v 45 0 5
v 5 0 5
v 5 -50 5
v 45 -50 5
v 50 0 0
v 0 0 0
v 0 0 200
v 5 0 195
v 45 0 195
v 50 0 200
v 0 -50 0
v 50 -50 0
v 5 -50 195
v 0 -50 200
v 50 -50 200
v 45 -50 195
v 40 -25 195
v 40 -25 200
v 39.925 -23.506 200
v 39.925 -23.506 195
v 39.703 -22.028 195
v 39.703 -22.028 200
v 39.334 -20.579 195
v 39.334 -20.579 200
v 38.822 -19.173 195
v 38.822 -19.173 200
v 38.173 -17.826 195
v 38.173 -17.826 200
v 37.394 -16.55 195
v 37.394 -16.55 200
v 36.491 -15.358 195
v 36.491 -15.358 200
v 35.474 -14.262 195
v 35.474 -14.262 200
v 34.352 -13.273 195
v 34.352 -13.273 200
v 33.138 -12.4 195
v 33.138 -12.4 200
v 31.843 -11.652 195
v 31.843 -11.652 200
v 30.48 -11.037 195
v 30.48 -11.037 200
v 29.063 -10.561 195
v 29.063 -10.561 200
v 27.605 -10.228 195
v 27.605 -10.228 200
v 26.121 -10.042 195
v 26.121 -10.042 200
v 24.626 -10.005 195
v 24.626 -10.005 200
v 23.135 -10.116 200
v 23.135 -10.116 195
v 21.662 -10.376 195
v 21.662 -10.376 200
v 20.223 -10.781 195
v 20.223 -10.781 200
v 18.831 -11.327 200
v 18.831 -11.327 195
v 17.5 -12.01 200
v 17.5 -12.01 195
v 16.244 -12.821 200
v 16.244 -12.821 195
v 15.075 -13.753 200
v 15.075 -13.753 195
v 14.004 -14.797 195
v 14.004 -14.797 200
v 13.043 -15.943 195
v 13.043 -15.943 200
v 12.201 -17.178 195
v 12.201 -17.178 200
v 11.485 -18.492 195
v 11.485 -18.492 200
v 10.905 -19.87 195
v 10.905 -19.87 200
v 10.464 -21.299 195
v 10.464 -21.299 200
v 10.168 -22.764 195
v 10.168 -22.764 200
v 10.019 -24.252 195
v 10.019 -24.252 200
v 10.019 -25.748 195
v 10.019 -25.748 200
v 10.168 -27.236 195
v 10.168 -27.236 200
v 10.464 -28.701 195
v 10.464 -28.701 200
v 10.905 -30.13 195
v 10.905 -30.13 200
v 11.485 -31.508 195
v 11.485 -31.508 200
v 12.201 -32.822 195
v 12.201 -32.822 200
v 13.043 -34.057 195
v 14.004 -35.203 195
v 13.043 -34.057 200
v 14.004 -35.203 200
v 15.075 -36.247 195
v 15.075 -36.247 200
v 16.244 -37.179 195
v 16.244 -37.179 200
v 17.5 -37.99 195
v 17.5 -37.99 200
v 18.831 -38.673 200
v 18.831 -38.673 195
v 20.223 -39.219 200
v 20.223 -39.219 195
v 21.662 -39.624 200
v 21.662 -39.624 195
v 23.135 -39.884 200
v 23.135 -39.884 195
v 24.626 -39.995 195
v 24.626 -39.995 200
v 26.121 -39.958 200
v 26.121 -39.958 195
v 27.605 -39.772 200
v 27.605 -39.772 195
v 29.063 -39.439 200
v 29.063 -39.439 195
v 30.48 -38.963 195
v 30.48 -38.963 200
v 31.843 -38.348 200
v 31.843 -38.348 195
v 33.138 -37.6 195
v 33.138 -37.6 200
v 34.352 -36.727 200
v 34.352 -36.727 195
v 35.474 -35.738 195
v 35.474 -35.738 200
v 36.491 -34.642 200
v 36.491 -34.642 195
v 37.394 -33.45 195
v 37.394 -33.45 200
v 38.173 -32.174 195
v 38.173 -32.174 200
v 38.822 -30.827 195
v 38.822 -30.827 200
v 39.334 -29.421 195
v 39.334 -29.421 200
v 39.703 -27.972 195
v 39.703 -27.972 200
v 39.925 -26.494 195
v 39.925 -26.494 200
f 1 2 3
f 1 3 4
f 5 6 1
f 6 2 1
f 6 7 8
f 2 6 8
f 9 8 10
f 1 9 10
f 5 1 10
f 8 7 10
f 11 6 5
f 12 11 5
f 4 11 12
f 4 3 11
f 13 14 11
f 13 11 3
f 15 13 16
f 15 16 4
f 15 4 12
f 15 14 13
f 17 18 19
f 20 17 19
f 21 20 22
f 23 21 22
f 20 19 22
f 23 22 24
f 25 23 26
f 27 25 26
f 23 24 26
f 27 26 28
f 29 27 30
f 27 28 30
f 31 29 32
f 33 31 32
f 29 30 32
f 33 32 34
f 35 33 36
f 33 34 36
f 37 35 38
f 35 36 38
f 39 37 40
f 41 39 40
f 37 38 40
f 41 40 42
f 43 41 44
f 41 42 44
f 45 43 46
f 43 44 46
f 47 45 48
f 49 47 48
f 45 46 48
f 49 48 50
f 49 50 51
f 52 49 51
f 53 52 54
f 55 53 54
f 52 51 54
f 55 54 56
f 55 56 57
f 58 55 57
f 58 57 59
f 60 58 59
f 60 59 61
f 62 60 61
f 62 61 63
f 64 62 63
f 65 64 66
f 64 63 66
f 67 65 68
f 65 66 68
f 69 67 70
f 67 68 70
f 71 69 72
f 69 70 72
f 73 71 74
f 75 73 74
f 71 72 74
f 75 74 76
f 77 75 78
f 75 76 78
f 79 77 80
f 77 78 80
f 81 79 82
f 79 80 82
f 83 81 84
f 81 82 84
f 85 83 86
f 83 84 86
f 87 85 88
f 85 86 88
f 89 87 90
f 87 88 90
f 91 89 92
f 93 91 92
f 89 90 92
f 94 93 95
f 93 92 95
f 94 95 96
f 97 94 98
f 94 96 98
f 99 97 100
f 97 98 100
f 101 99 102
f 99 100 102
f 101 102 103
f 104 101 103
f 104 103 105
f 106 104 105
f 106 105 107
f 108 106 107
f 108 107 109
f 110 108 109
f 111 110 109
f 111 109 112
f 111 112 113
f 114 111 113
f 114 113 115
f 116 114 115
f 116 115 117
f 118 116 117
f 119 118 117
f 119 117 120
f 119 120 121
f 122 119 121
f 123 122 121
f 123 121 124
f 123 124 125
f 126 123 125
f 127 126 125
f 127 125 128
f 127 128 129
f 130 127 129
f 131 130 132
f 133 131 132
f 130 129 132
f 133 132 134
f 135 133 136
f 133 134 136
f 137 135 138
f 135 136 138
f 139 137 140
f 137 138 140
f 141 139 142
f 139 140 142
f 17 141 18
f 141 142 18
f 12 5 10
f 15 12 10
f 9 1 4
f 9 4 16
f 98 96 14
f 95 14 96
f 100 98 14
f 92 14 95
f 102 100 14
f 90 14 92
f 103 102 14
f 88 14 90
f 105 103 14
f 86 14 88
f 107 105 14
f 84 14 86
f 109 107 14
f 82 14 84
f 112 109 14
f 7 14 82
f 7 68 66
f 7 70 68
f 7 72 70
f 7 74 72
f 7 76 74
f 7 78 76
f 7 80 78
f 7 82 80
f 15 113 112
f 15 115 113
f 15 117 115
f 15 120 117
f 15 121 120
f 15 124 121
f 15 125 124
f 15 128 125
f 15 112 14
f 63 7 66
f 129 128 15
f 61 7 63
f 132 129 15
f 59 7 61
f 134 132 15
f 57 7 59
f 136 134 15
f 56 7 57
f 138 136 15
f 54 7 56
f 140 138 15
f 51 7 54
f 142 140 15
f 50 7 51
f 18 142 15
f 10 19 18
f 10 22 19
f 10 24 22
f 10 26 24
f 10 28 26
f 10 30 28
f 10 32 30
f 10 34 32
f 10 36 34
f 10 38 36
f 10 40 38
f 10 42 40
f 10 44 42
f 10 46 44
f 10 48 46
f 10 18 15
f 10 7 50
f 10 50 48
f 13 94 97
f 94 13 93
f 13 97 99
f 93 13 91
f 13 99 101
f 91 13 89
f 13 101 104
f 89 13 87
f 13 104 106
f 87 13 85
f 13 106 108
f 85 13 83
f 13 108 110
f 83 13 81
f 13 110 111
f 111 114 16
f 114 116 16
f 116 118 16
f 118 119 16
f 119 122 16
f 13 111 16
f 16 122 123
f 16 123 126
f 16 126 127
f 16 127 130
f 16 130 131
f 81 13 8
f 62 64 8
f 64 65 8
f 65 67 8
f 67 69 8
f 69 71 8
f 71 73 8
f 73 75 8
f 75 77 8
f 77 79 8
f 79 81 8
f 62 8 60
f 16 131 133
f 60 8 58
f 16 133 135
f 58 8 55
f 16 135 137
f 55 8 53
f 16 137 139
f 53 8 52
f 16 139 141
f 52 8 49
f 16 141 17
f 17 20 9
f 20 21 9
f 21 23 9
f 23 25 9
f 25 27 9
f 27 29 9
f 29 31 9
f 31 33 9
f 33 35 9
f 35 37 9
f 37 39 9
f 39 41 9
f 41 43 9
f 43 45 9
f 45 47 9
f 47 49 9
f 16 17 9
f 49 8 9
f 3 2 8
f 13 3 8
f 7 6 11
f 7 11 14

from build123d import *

# Parameters (mm, degrees)
F0_W     = 50
F0_H     = 200
F0_W_2   = 40
F0_H_2   = 190
F1_DEPTH = 50
F2_R     = 15
F3_DEPTH = 5


with BuildPart() as f1:
    # F0 (on Front) → F1 (new body)
    with BuildSketch(Plane.XZ):
        with Locations((25, 100)):
            Rectangle(F0_W, F0_H)
        with Locations((25, 100)):
            Rectangle(F0_W_2, F0_H_2, mode=Mode.SUBTRACT)
    extrude(amount=F1_DEPTH)

    # F2 (on face) → F3 (cut, through all)
    with BuildSketch(Plane.XY.offset(200)):
        with Locations((25, -25)):
            Circle(F2_R)
    extrude(amount=-F3_DEPTH, mode=Mode.SUBTRACT)


solid = f1.part
